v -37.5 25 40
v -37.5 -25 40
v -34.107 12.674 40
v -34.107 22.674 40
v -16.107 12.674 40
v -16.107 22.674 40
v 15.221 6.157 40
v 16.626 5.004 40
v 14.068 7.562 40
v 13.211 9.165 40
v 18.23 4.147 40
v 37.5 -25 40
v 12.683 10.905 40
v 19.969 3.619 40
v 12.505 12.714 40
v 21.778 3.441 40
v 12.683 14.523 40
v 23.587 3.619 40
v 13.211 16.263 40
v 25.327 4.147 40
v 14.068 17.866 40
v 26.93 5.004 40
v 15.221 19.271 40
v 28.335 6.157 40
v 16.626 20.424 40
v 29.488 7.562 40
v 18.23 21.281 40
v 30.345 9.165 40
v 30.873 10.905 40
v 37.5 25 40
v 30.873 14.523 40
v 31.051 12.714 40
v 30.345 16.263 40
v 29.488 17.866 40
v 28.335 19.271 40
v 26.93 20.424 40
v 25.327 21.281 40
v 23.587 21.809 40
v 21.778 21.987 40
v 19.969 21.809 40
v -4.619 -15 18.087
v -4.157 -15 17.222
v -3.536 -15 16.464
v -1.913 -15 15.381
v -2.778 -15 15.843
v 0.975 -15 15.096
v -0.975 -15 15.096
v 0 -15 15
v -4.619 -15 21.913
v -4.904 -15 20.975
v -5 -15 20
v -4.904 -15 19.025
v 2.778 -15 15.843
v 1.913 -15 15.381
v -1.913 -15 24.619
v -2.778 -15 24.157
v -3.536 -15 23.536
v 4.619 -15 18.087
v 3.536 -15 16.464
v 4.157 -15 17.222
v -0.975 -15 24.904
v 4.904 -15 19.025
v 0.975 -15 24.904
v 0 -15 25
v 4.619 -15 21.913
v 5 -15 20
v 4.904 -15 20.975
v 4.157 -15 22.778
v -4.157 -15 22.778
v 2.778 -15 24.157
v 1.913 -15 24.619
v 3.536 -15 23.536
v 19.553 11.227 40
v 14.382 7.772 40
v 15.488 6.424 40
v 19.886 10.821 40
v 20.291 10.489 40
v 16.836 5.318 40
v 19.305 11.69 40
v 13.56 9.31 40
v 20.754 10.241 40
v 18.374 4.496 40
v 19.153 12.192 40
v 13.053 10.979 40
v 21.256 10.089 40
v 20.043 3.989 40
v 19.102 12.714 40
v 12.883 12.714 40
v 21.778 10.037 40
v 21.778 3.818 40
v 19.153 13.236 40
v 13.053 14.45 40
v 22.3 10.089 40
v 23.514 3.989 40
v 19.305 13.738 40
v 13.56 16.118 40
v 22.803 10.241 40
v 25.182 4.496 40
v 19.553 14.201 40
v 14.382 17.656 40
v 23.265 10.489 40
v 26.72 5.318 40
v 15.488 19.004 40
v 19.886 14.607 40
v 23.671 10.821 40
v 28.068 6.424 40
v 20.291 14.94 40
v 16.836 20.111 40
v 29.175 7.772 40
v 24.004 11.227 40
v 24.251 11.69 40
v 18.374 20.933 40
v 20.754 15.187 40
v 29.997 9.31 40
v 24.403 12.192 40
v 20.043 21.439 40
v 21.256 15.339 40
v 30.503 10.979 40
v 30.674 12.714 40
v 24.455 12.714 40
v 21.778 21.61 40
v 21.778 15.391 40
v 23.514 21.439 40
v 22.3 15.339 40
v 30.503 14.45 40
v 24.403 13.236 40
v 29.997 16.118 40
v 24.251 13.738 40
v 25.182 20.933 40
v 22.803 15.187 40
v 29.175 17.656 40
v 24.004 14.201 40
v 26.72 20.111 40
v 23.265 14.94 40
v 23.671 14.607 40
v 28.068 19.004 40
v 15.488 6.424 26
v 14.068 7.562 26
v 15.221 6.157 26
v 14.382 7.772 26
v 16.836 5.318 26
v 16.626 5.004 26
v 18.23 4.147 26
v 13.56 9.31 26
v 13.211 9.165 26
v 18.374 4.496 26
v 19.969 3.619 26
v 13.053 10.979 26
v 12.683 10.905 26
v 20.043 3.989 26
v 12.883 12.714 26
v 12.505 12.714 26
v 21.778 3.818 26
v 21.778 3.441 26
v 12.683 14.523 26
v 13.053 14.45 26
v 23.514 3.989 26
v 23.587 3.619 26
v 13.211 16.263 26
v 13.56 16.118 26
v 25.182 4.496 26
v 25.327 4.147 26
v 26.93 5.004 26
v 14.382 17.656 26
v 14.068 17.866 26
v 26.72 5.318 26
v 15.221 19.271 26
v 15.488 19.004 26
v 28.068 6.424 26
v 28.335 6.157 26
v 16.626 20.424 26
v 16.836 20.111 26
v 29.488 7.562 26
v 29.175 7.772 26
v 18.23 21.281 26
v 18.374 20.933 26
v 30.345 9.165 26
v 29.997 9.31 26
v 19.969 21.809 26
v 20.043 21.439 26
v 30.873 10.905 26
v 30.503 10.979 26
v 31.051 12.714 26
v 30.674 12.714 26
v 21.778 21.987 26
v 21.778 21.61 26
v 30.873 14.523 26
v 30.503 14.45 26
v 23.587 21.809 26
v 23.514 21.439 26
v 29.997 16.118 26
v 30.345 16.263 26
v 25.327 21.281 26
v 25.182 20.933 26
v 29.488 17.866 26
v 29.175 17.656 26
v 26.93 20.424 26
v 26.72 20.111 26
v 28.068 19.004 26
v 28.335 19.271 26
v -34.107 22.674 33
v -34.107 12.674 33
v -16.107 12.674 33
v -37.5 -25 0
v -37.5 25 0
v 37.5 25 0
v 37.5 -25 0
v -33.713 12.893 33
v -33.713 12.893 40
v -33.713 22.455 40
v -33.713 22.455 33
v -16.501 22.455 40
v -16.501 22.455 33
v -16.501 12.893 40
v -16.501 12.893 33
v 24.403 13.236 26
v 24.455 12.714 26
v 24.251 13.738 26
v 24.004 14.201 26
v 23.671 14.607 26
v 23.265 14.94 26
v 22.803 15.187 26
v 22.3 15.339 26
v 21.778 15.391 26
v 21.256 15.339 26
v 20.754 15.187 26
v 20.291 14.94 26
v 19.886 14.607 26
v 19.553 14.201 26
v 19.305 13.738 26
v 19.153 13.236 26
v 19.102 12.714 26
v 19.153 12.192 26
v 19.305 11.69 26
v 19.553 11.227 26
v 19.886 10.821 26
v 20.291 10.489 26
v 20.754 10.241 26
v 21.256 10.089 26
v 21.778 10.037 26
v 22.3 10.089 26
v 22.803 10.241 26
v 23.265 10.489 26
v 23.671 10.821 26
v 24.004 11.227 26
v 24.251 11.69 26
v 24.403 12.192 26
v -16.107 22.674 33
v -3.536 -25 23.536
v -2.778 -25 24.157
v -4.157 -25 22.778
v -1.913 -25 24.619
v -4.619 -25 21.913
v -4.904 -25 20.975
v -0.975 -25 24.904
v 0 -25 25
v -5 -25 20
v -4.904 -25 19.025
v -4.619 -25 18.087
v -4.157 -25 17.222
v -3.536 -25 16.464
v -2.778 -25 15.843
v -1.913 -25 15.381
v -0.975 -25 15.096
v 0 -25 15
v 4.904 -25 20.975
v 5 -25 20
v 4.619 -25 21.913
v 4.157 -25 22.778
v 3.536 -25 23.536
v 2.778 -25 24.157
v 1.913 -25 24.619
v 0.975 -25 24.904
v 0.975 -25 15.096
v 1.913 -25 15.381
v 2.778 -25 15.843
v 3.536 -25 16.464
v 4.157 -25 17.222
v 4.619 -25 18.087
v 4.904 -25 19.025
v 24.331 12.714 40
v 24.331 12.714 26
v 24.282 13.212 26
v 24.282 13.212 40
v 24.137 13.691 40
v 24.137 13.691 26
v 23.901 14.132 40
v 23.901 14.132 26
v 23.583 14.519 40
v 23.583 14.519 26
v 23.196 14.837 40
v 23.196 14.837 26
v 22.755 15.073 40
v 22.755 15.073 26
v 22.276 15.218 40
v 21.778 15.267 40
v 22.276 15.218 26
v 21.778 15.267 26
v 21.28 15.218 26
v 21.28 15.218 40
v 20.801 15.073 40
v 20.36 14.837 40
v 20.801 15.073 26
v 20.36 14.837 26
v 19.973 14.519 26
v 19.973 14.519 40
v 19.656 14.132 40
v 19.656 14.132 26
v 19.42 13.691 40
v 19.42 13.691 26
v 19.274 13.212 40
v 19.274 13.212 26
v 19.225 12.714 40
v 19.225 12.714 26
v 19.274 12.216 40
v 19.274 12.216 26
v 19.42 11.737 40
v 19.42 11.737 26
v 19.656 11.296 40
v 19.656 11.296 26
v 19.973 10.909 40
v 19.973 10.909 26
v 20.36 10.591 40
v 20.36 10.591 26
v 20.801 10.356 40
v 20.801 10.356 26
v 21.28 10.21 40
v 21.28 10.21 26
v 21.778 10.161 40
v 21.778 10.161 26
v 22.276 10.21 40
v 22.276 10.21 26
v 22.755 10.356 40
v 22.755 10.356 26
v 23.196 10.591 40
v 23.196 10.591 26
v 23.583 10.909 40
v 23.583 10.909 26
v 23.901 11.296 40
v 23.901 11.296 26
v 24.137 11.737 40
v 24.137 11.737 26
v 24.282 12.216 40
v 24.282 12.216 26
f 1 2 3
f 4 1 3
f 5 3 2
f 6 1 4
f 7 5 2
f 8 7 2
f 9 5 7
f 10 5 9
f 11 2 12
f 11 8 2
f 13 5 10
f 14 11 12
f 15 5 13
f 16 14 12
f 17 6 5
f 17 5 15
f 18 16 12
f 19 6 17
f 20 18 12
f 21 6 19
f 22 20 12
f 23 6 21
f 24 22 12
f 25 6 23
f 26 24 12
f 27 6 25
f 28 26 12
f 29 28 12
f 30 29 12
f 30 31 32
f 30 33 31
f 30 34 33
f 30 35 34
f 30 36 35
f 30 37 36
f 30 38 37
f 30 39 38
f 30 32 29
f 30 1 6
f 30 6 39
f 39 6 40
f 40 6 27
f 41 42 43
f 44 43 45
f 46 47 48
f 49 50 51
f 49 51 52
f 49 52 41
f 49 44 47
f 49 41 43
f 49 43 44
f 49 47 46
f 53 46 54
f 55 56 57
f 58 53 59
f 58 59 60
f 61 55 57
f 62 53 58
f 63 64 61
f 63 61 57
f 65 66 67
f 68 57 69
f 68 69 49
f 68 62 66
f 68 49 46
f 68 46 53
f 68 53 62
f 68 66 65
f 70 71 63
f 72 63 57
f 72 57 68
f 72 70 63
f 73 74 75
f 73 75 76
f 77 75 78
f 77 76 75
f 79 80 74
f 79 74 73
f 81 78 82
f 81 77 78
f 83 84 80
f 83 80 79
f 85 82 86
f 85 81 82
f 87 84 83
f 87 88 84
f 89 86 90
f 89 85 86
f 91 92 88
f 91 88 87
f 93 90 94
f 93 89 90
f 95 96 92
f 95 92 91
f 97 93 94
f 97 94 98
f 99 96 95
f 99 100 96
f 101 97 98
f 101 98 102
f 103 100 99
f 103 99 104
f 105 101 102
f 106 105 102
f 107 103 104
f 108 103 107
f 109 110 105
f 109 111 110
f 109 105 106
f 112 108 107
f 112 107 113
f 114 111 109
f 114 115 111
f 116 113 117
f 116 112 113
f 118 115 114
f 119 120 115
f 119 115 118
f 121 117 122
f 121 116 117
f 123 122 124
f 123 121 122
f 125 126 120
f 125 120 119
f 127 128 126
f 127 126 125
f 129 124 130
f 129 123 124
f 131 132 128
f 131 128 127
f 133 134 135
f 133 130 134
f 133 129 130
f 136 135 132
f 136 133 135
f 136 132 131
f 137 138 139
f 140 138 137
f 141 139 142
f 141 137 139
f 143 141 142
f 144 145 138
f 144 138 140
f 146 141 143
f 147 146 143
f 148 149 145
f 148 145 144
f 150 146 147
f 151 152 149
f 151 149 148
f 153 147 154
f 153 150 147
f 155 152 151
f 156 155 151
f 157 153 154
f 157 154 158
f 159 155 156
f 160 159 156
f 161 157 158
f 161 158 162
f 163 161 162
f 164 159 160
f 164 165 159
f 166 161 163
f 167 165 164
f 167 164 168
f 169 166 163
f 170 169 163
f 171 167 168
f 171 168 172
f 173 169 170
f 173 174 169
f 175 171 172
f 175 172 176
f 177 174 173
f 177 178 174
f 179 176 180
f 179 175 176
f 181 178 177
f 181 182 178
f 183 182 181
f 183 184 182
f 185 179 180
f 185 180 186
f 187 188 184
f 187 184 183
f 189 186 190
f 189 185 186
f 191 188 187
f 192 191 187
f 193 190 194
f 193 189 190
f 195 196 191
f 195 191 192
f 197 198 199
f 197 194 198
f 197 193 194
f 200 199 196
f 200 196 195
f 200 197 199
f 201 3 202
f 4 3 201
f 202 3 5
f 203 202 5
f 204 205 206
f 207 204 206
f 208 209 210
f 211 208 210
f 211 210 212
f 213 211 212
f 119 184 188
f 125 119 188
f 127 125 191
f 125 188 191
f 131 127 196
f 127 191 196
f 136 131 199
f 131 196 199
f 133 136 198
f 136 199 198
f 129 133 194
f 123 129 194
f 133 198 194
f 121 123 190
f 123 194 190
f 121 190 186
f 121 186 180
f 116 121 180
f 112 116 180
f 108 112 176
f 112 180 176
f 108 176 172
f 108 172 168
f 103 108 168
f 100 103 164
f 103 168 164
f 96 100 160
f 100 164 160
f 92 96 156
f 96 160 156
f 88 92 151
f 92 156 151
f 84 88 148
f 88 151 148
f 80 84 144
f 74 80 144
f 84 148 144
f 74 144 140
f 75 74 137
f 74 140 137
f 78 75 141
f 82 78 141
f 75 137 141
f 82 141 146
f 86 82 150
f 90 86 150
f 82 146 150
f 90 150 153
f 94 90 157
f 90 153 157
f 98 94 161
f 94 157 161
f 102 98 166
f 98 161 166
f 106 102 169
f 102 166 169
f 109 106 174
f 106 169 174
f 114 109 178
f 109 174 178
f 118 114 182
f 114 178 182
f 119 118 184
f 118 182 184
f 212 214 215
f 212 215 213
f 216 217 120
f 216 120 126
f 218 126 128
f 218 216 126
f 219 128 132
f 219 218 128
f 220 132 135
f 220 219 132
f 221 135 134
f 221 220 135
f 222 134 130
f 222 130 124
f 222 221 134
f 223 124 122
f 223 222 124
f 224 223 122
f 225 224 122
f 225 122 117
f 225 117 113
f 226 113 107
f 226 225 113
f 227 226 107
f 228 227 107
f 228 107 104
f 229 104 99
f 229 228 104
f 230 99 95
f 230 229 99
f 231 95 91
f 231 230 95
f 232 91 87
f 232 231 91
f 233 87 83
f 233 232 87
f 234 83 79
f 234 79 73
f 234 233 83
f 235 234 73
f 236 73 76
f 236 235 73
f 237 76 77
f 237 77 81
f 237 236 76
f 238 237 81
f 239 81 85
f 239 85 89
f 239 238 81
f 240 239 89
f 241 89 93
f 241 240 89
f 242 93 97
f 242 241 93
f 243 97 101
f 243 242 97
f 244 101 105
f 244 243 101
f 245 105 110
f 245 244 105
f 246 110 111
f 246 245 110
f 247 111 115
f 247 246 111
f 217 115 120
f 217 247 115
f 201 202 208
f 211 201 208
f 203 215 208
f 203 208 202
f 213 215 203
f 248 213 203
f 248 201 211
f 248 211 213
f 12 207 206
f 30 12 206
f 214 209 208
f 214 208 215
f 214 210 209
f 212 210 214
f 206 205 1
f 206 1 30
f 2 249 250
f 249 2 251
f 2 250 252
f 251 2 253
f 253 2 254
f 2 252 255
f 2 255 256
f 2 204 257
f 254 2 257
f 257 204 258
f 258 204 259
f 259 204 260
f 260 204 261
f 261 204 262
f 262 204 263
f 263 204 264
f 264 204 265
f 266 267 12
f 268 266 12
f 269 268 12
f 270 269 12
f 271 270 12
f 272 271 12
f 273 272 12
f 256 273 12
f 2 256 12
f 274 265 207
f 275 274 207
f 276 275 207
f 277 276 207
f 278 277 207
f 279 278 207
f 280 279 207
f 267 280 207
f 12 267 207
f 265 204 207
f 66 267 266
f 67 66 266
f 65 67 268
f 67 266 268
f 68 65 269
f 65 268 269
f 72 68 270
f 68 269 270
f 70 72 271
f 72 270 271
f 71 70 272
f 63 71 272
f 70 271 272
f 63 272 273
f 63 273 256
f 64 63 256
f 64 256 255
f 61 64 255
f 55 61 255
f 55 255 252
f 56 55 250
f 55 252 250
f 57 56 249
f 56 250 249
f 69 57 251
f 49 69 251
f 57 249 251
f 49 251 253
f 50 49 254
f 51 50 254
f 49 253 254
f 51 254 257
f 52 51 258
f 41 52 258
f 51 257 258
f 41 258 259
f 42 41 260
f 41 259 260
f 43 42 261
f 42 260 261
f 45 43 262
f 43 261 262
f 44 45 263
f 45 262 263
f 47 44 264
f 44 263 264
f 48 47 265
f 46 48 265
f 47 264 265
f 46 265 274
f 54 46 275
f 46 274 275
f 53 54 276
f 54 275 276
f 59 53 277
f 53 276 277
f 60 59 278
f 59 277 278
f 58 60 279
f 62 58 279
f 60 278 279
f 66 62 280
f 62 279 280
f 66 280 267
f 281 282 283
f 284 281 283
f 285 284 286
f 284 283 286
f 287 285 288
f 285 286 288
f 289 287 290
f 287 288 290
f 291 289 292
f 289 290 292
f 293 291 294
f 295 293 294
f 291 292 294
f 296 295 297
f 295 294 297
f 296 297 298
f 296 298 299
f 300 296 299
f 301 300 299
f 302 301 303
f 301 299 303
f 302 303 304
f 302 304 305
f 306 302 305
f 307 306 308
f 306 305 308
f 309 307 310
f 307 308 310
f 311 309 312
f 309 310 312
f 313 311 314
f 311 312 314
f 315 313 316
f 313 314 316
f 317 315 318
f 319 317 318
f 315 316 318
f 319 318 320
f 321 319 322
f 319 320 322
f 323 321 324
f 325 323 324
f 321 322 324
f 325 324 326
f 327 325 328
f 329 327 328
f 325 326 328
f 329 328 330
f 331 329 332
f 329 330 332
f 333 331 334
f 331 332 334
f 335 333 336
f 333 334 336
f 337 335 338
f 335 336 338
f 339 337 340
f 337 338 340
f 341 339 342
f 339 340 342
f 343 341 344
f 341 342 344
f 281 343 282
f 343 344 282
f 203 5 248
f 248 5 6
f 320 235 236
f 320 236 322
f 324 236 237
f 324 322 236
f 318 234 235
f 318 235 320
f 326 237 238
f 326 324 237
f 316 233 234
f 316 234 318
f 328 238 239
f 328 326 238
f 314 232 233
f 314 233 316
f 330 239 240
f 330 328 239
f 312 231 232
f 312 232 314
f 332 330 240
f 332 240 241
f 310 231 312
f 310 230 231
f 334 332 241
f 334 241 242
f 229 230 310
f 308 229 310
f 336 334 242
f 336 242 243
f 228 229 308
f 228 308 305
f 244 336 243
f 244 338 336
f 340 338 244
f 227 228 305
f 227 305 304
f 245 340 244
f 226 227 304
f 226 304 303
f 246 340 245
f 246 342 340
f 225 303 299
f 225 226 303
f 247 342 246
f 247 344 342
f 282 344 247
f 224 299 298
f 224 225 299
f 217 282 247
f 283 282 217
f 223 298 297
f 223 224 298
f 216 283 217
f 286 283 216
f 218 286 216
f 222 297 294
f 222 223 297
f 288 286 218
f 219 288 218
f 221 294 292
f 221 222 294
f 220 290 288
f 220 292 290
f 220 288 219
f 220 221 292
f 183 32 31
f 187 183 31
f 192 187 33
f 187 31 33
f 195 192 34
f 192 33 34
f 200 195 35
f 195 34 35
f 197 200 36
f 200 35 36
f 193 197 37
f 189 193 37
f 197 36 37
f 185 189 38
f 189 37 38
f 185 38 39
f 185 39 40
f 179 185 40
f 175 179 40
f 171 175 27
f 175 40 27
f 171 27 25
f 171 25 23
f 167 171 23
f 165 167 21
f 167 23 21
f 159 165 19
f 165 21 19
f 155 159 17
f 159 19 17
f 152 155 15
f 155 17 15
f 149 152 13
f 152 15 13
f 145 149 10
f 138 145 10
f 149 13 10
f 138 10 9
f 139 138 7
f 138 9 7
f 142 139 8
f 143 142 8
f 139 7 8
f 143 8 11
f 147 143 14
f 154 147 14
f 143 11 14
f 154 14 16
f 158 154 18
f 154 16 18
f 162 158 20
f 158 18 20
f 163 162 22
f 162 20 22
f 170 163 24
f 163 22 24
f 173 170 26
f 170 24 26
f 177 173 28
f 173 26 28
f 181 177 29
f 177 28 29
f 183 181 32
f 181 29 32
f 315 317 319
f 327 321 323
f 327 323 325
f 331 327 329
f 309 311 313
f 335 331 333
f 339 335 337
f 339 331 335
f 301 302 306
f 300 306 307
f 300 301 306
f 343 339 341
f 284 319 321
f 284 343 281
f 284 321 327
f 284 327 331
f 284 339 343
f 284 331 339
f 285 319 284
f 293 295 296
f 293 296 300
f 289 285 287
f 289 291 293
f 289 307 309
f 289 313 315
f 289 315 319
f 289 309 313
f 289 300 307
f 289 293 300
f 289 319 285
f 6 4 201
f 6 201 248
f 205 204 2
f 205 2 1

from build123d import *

# Parameters (mm, degrees)
SKETCH1_W           = 75
SKETCH1_H           = 50
BOSS_EXTRUDE1_DEPTH = 40
SKETCH2_R           = 9.272983733
CUT_EXTRUDE1_DEPTH  = 14
SKETCH3_R           = 8.895673095
SKETCH3_R_2         = 2.676649409
BOSS_EXTRUDE2_DEPTH = 14
SKETCH4_R           = 2.552861956
BOSS_EXTRUDE3_DEPTH = 14
SKETCH5_W           = 18
SKETCH5_H           = 10
SKETCH5_W_2         = 17.211665491
SKETCH5_H_2         = 9.562036384
CUT_EXTRUDE2_DEPTH  = 7
SKETCH6_R           = 5
CUT_EXTRUDE3_DEPTH  = 10


with BuildPart() as part:
    # Sketch1 → Boss-Extrude1 (new body)
    with BuildSketch(Plane.XY):
        Rectangle(SKETCH1_W, SKETCH1_H)
    extrude(amount=BOSS_EXTRUDE1_DEPTH)

    # Sketch2 → Cut-Extrude1 (cut)
    with BuildSketch(Plane.XY.offset(40)):
        with Locations((21.778192922, 12.714084695)):
            Circle(SKETCH2_R)
    extrude(amount=-CUT_EXTRUDE1_DEPTH, mode=Mode.SUBTRACT)

    # Sketch3 → Boss-Extrude2 (add)
    with BuildSketch(Plane.XY.offset(26)):
        with Locations((21.778192922, 12.714084695)):
            Circle(SKETCH3_R)
        with Locations((21.778192922, 12.714084695)):
            Circle(SKETCH3_R_2, mode=Mode.SUBTRACT)
    extrude(amount=BOSS_EXTRUDE2_DEPTH)

    # Sketch4 → Boss-Extrude3 (add)
    with BuildSketch(Plane.XY.offset(26)):
        with Locations((21.778192922, 12.714084695)):
            Circle(SKETCH4_R)
    extrude(amount=BOSS_EXTRUDE3_DEPTH)

    # Sketch5 → Cut-Extrude2 (cut)
    with BuildSketch(Plane.XY.offset(40)):
        with Locations((-25.106926905, 17.674362133)):
            Rectangle(SKETCH5_W, SKETCH5_H)
        with Locations((-25.106926904, 17.674362133)):
            Rectangle(SKETCH5_W_2, SKETCH5_H_2, mode=Mode.SUBTRACT)
    extrude(amount=-CUT_EXTRUDE2_DEPTH, mode=Mode.SUBTRACT)

    # Sketch6 → Cut-Extrude3 (cut)
    with BuildSketch(Plane.XZ.offset(25)):
        with Locations((0, 20)):
            Circle(SKETCH6_R)
    extrude(amount=-CUT_EXTRUDE3_DEPTH, mode=Mode.SUBTRACT)


solid = part.part
